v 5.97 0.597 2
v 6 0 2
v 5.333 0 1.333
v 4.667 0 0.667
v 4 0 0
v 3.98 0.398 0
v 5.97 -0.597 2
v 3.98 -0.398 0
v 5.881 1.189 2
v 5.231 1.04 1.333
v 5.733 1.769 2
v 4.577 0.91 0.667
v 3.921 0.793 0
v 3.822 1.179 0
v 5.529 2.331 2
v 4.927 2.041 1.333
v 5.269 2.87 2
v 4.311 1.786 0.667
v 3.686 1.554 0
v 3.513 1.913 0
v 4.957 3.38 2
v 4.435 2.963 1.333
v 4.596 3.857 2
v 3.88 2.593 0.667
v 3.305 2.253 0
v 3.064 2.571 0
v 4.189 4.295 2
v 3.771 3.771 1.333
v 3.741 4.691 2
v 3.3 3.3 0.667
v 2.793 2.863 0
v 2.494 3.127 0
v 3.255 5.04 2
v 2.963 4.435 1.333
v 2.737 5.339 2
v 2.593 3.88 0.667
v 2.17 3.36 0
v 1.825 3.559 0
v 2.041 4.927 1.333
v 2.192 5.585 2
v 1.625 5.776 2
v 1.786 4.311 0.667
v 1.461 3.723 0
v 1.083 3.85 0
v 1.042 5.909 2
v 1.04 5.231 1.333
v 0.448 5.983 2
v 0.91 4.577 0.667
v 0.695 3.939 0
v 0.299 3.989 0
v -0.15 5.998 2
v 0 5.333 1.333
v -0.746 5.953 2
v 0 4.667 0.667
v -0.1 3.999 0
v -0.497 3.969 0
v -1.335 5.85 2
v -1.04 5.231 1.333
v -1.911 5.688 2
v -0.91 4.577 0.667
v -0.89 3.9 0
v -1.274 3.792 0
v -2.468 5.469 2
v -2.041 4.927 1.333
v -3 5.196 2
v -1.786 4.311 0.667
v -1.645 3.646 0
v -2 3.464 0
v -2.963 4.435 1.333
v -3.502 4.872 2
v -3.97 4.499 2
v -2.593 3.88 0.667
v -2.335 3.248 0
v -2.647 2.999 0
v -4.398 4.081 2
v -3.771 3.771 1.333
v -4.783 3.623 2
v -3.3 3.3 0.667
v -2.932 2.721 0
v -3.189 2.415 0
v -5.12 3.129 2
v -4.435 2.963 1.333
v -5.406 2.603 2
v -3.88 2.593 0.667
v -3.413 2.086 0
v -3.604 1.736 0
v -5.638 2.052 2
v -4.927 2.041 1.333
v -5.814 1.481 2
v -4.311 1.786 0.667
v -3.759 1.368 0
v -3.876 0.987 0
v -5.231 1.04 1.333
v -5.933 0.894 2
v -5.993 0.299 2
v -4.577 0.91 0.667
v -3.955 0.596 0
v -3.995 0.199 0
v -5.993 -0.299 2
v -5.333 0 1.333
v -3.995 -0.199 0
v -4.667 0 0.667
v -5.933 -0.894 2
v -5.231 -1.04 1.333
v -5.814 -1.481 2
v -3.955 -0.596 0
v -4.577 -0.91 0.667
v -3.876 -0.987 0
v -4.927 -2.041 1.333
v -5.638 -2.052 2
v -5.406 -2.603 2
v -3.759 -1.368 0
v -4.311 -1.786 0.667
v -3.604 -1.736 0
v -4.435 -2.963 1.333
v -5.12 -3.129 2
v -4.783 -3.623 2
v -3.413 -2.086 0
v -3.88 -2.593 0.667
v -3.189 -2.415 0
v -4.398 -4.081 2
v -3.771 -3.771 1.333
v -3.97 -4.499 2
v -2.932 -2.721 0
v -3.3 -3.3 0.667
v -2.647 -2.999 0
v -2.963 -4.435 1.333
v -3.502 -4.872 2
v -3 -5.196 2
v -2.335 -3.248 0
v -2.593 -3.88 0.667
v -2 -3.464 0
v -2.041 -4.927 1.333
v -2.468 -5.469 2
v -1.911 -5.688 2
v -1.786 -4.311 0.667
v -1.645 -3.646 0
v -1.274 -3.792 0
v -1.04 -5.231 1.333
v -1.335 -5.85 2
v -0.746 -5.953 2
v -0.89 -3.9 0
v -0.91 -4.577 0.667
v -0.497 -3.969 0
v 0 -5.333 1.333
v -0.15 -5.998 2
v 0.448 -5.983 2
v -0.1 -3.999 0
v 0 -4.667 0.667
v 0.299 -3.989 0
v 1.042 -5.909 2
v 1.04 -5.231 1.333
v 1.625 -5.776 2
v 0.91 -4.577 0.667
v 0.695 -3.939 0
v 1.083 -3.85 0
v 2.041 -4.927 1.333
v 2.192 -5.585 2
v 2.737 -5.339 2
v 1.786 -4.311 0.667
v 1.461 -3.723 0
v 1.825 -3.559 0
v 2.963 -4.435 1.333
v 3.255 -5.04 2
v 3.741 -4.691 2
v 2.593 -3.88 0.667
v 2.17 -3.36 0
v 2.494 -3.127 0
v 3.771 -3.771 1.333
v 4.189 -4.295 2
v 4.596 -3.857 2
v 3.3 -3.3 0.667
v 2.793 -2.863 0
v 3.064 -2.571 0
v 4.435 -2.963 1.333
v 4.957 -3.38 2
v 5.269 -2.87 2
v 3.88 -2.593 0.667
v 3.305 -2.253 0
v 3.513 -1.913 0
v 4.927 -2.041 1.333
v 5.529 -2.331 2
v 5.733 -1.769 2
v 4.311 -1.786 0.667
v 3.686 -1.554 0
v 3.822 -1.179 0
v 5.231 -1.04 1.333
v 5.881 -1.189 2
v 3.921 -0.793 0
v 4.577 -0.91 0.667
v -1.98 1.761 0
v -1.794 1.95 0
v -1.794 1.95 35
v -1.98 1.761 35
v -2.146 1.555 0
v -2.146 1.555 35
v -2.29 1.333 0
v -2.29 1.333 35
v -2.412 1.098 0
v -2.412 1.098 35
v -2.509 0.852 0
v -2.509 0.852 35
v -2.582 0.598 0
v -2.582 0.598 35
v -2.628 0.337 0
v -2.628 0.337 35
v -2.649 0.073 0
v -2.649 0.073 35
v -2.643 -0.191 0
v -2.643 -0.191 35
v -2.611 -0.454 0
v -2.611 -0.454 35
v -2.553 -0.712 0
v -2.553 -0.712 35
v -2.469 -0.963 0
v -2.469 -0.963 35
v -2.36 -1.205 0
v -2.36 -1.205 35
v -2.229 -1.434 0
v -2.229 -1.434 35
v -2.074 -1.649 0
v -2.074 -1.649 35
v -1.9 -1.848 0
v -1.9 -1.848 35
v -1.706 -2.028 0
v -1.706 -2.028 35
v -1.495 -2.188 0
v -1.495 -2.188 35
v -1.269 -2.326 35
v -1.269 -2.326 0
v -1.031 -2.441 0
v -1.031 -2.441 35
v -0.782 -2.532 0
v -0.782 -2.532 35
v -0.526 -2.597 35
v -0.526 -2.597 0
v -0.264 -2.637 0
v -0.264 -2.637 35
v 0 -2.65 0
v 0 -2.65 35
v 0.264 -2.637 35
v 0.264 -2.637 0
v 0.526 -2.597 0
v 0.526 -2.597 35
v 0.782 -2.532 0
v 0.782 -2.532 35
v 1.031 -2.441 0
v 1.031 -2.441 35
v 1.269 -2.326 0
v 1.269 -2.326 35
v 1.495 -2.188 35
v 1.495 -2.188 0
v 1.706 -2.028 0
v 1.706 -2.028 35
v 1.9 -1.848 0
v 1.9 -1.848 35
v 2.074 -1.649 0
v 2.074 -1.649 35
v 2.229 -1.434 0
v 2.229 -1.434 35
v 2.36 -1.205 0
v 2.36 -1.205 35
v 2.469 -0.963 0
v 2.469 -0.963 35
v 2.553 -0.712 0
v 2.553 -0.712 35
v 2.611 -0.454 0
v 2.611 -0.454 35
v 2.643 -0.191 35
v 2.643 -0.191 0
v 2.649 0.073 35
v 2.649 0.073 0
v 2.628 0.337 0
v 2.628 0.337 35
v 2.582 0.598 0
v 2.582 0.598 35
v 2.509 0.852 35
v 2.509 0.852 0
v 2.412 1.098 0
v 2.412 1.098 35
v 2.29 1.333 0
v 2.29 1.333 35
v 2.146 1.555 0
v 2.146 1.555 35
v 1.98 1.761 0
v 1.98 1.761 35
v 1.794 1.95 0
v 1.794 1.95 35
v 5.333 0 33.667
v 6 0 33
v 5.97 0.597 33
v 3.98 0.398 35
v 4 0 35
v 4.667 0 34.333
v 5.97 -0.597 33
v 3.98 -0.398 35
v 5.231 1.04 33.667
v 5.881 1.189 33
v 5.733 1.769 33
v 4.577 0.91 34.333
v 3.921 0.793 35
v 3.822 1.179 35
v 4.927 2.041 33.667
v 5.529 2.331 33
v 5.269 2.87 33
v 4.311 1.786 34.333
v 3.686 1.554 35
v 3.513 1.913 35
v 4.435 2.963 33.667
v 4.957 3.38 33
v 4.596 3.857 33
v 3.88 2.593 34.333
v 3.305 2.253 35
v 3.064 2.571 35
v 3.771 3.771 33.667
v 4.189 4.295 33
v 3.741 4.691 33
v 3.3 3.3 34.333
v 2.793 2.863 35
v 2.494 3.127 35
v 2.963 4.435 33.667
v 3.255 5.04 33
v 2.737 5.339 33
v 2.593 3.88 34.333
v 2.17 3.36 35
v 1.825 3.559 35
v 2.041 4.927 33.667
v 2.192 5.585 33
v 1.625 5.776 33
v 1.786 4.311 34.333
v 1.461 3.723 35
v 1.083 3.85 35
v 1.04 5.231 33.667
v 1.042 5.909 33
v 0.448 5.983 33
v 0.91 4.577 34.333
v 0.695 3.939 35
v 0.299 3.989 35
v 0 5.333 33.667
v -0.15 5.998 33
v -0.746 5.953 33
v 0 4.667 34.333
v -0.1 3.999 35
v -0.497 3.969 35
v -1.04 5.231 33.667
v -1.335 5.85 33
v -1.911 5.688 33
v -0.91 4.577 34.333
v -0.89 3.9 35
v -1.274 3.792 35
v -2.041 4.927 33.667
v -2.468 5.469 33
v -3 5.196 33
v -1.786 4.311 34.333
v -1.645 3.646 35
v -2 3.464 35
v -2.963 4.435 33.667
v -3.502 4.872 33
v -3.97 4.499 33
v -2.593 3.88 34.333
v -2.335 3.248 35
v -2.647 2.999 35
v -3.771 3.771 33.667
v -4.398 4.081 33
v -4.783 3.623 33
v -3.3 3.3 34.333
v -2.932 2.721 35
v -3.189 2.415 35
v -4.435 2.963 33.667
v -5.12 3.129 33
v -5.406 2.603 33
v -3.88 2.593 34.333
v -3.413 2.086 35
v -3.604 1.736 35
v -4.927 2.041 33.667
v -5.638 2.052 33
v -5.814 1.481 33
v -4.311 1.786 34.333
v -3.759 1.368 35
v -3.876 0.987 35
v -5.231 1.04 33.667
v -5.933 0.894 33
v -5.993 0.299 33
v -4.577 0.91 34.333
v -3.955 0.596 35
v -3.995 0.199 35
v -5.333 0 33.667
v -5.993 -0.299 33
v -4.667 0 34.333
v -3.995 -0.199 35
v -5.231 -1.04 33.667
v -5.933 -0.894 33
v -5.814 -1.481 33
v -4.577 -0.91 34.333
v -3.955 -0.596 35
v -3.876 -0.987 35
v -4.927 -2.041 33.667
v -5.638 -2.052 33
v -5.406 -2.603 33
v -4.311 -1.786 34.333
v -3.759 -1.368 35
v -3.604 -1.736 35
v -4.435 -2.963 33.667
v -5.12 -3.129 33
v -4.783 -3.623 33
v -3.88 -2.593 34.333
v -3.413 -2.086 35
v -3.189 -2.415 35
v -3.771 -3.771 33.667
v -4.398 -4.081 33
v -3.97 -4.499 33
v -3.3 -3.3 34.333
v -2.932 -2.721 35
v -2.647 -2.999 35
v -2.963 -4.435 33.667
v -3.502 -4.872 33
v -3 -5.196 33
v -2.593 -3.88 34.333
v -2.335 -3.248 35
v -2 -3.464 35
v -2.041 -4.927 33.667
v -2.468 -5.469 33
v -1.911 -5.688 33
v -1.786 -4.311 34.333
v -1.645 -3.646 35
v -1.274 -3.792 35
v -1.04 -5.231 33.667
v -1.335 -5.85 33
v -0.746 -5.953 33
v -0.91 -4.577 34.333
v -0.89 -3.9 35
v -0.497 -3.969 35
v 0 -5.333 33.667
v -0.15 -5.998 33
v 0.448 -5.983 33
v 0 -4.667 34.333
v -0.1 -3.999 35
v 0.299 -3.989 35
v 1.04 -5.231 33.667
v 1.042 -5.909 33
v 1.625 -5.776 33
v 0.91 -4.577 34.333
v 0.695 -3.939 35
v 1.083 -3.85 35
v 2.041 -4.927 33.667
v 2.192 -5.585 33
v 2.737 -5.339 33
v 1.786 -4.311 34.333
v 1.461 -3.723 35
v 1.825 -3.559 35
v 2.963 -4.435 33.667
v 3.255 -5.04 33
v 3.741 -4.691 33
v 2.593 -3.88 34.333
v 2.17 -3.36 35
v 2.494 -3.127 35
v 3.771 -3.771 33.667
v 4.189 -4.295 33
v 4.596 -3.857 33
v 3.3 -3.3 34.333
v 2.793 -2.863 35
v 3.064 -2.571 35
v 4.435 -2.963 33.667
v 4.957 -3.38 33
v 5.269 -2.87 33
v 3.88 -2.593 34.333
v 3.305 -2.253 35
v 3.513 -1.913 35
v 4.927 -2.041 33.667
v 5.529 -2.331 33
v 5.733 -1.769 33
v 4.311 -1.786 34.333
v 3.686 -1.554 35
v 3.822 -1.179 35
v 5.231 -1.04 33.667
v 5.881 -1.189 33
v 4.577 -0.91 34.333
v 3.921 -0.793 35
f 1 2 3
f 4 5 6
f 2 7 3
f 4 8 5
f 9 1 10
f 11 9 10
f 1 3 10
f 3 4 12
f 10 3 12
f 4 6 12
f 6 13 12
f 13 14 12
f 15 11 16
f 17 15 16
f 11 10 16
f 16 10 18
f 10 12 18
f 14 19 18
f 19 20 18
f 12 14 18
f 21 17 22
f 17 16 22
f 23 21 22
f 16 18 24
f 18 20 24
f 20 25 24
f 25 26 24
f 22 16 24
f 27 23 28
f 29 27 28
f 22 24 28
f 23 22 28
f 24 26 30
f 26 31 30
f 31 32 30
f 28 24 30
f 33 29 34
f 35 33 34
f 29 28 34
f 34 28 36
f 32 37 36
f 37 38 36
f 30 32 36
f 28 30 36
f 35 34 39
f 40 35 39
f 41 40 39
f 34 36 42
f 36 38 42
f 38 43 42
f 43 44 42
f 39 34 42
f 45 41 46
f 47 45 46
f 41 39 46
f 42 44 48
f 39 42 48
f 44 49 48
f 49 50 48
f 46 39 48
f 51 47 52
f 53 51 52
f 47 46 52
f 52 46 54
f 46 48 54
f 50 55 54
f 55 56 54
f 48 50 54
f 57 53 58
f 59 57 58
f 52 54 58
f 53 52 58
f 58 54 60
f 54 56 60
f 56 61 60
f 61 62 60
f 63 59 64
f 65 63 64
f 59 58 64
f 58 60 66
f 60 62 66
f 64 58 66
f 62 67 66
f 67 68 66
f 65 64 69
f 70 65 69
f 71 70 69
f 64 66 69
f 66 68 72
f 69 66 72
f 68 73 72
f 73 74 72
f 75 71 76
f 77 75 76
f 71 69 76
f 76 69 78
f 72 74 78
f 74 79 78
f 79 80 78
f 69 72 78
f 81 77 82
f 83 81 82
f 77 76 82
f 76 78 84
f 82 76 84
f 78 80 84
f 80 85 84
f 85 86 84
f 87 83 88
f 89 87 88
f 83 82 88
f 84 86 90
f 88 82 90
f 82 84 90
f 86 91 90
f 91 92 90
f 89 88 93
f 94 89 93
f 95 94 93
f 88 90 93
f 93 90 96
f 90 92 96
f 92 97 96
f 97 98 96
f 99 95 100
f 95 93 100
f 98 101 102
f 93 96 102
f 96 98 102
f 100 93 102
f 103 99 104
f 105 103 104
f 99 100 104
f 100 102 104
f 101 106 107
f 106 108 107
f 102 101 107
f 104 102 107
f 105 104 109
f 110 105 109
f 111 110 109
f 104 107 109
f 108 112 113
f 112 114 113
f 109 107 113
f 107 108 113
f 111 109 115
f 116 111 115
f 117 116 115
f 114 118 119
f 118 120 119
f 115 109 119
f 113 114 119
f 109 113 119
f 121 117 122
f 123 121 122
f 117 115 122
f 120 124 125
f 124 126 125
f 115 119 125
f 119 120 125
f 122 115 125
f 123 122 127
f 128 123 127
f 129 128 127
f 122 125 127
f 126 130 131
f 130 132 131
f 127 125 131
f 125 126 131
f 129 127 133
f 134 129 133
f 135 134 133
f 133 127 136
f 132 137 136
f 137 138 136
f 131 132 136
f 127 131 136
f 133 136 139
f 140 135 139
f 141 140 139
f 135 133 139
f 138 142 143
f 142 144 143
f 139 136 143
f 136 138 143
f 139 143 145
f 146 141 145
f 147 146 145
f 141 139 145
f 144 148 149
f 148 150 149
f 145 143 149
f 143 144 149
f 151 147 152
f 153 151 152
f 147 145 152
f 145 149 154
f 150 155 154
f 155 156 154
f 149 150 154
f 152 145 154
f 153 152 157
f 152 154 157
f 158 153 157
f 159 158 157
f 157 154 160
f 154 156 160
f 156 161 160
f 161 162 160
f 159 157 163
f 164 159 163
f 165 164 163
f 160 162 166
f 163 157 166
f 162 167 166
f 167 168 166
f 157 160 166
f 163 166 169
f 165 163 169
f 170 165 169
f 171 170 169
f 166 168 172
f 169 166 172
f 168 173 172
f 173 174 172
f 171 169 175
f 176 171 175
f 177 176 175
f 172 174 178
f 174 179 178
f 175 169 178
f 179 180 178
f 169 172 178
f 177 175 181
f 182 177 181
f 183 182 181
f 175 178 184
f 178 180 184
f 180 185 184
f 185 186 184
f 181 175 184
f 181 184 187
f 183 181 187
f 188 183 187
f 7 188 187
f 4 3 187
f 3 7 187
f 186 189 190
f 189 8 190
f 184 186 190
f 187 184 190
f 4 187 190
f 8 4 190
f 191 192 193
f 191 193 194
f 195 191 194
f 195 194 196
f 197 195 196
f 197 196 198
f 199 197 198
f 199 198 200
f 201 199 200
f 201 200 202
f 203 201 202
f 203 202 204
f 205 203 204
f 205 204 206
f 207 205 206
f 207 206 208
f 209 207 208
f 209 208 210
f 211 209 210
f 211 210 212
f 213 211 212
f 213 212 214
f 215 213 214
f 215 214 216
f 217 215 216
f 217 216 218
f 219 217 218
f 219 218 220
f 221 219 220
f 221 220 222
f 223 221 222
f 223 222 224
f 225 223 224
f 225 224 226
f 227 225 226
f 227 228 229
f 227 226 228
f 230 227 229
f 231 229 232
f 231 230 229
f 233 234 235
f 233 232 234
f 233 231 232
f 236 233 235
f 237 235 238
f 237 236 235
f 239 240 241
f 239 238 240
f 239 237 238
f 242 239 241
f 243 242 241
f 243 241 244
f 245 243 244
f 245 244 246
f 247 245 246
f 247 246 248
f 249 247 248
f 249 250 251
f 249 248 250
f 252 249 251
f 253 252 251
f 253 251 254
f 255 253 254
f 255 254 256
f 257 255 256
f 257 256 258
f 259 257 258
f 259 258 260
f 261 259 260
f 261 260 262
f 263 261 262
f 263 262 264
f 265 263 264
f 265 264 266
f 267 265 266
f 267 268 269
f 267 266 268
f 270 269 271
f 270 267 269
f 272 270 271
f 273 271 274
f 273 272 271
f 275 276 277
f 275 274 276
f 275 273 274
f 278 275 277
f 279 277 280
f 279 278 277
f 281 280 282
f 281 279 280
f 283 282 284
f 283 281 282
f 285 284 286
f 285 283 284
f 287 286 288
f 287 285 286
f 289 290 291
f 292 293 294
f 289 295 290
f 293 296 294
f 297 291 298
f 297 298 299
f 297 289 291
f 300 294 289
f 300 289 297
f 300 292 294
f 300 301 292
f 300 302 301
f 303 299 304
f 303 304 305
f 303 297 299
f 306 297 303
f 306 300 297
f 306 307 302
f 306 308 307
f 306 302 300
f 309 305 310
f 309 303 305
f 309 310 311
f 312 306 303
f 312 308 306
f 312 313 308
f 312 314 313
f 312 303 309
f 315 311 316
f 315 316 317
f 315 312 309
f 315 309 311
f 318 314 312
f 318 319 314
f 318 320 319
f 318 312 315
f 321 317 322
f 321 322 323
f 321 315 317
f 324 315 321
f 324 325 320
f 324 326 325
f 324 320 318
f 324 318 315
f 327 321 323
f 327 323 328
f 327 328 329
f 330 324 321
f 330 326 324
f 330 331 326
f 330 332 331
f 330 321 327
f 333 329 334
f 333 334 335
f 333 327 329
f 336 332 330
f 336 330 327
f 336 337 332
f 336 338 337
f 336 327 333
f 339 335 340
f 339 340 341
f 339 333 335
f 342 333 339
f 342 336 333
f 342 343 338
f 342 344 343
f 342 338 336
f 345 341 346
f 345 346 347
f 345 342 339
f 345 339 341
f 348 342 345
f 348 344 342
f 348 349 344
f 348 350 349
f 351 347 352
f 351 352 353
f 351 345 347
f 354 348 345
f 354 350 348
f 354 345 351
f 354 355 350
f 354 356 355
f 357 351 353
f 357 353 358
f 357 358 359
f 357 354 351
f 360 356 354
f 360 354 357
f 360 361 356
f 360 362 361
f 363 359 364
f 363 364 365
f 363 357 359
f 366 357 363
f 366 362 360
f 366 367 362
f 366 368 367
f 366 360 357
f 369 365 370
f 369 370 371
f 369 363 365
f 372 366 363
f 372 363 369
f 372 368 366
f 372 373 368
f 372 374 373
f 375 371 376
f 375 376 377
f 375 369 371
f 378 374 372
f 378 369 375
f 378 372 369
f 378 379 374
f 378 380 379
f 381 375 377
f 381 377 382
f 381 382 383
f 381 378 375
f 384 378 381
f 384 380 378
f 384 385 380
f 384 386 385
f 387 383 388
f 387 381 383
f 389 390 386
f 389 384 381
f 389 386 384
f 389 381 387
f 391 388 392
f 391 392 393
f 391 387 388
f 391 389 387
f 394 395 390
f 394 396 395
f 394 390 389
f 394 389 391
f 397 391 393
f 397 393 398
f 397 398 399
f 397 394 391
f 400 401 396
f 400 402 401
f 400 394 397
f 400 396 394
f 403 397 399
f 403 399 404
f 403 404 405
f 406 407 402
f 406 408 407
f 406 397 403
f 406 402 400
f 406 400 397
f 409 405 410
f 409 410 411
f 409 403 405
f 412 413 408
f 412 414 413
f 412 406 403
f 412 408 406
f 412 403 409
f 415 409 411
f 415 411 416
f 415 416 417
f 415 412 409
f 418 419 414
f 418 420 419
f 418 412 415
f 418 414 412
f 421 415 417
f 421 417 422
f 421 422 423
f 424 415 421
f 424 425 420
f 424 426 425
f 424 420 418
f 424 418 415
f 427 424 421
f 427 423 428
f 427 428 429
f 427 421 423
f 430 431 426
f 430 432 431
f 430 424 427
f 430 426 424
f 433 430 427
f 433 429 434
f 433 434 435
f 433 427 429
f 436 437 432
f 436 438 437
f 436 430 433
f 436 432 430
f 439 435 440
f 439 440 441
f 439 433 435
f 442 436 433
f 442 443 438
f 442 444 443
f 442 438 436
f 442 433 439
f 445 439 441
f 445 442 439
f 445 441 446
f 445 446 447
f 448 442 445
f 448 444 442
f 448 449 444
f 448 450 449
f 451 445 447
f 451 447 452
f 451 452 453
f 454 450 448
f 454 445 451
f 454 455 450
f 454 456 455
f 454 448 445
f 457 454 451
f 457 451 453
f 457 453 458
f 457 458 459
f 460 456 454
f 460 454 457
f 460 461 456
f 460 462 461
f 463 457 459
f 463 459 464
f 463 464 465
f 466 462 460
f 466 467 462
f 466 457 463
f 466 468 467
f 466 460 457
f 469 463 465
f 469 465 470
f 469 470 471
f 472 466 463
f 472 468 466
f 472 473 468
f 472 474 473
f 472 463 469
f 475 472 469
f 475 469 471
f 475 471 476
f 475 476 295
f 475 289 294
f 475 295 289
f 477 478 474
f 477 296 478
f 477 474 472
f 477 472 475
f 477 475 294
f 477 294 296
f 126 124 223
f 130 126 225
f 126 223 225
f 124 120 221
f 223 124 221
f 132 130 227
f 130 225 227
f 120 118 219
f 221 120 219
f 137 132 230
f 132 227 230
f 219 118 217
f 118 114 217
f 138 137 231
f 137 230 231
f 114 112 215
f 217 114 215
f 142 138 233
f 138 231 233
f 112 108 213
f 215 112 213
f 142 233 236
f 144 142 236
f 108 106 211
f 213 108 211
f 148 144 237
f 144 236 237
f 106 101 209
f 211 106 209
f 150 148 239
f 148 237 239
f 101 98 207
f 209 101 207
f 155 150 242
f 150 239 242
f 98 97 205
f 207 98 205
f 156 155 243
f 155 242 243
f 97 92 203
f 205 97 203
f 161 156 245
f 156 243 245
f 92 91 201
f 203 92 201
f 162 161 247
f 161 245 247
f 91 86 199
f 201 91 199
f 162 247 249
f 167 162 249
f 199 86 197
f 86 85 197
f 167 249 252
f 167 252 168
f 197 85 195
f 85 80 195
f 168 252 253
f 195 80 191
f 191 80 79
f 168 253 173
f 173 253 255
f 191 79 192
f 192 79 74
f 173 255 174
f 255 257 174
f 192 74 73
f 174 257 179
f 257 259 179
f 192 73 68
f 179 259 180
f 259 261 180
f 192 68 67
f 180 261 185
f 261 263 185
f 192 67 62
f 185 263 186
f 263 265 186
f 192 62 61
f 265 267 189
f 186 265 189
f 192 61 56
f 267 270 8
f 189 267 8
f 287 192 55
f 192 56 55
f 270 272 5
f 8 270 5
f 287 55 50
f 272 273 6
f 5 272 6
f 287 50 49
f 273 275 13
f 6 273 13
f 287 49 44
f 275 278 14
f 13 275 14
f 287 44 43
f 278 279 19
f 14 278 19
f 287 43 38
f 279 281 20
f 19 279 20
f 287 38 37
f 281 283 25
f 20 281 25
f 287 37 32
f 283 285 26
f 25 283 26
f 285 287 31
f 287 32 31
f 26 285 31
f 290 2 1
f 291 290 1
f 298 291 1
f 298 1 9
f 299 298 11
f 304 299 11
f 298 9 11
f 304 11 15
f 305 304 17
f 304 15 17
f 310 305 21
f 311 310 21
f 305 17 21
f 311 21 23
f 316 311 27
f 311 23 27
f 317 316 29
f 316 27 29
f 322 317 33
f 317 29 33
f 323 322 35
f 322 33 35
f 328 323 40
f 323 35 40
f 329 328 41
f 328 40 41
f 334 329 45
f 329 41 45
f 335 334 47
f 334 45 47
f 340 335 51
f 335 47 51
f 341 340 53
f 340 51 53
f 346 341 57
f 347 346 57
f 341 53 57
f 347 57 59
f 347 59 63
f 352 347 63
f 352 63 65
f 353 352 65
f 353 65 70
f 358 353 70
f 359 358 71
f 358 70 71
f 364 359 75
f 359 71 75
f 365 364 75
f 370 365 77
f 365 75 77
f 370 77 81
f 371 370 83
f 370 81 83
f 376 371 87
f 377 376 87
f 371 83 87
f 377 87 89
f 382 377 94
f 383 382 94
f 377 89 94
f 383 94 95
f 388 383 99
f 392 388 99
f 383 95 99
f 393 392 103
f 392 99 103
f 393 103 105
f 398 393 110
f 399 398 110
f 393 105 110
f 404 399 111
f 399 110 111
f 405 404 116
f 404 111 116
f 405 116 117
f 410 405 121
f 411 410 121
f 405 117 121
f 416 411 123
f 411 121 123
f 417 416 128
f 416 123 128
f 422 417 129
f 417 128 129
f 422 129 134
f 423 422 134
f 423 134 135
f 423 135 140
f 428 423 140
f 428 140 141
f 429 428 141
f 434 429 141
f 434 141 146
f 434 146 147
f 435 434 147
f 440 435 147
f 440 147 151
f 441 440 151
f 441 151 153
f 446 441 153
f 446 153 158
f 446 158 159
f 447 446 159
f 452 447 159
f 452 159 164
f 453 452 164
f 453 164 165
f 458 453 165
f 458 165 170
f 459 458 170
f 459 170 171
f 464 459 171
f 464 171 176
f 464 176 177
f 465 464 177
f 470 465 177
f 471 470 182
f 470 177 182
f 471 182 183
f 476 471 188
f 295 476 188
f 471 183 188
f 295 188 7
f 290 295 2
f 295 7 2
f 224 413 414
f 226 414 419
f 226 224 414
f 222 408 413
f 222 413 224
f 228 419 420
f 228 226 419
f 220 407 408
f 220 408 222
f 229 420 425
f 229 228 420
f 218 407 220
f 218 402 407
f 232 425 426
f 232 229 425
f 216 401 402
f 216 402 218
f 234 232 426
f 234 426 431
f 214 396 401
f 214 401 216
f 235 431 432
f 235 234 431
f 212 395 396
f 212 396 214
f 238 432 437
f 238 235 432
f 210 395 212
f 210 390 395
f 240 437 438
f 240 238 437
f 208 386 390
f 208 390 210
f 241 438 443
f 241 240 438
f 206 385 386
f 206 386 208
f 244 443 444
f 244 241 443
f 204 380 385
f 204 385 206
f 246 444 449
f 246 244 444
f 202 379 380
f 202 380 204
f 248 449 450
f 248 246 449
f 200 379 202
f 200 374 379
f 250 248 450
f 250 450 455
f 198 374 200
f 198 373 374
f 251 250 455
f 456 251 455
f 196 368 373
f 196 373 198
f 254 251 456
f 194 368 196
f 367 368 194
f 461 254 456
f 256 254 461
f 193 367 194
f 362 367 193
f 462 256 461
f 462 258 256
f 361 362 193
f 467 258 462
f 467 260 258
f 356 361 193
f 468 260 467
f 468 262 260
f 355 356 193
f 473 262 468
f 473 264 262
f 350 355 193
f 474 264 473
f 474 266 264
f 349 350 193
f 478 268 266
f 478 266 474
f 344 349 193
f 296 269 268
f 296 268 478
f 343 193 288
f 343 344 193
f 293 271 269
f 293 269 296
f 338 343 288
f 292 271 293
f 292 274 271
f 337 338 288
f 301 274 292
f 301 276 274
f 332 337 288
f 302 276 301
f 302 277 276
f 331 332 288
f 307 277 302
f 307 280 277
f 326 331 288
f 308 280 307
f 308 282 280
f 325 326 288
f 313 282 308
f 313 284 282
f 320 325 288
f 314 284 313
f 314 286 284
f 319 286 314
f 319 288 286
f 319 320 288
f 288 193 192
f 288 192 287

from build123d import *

# Parameters (mm, degrees)
SKETCH1_R           = 6
SKETCH1_R_2         = 2.65
BOSS_EXTRUDE1_DEPTH = 35
BOSS_EXTRUDE2_DEPTH = 35
CHAMFER1_SIZE       = 2


with BuildPart() as part:
    # Sketch1 → Boss-Extrude1 (new body)
    with BuildSketch(Plane.XY):
        Circle(SKETCH1_R)
        Circle(SKETCH1_R_2, mode=Mode.SUBTRACT)
    extrude(amount=BOSS_EXTRUDE1_DEPTH)

    # Sketch2 → Boss-Extrude2 (add)
    with BuildSketch(Plane.XY.offset(35)):
        with BuildLine():
            ThreePointArc((1.794435844, 1.95), (0, 2.65), (-1.794435844, 1.95))
            Line((-1.794435844, 1.95), (1.794435844, 1.95))
        make_face()
    extrude(amount=-BOSS_EXTRUDE2_DEPTH)

    # Chamfer1
    chamfer1_edges = [part.edges().sort_by_distance(p)[0] for p in [
        (-6, 0, 0),
        (-6, 0, 35),
    ]]
    chamfer(chamfer1_edges, length=CHAMFER1_SIZE)


solid = part.part
